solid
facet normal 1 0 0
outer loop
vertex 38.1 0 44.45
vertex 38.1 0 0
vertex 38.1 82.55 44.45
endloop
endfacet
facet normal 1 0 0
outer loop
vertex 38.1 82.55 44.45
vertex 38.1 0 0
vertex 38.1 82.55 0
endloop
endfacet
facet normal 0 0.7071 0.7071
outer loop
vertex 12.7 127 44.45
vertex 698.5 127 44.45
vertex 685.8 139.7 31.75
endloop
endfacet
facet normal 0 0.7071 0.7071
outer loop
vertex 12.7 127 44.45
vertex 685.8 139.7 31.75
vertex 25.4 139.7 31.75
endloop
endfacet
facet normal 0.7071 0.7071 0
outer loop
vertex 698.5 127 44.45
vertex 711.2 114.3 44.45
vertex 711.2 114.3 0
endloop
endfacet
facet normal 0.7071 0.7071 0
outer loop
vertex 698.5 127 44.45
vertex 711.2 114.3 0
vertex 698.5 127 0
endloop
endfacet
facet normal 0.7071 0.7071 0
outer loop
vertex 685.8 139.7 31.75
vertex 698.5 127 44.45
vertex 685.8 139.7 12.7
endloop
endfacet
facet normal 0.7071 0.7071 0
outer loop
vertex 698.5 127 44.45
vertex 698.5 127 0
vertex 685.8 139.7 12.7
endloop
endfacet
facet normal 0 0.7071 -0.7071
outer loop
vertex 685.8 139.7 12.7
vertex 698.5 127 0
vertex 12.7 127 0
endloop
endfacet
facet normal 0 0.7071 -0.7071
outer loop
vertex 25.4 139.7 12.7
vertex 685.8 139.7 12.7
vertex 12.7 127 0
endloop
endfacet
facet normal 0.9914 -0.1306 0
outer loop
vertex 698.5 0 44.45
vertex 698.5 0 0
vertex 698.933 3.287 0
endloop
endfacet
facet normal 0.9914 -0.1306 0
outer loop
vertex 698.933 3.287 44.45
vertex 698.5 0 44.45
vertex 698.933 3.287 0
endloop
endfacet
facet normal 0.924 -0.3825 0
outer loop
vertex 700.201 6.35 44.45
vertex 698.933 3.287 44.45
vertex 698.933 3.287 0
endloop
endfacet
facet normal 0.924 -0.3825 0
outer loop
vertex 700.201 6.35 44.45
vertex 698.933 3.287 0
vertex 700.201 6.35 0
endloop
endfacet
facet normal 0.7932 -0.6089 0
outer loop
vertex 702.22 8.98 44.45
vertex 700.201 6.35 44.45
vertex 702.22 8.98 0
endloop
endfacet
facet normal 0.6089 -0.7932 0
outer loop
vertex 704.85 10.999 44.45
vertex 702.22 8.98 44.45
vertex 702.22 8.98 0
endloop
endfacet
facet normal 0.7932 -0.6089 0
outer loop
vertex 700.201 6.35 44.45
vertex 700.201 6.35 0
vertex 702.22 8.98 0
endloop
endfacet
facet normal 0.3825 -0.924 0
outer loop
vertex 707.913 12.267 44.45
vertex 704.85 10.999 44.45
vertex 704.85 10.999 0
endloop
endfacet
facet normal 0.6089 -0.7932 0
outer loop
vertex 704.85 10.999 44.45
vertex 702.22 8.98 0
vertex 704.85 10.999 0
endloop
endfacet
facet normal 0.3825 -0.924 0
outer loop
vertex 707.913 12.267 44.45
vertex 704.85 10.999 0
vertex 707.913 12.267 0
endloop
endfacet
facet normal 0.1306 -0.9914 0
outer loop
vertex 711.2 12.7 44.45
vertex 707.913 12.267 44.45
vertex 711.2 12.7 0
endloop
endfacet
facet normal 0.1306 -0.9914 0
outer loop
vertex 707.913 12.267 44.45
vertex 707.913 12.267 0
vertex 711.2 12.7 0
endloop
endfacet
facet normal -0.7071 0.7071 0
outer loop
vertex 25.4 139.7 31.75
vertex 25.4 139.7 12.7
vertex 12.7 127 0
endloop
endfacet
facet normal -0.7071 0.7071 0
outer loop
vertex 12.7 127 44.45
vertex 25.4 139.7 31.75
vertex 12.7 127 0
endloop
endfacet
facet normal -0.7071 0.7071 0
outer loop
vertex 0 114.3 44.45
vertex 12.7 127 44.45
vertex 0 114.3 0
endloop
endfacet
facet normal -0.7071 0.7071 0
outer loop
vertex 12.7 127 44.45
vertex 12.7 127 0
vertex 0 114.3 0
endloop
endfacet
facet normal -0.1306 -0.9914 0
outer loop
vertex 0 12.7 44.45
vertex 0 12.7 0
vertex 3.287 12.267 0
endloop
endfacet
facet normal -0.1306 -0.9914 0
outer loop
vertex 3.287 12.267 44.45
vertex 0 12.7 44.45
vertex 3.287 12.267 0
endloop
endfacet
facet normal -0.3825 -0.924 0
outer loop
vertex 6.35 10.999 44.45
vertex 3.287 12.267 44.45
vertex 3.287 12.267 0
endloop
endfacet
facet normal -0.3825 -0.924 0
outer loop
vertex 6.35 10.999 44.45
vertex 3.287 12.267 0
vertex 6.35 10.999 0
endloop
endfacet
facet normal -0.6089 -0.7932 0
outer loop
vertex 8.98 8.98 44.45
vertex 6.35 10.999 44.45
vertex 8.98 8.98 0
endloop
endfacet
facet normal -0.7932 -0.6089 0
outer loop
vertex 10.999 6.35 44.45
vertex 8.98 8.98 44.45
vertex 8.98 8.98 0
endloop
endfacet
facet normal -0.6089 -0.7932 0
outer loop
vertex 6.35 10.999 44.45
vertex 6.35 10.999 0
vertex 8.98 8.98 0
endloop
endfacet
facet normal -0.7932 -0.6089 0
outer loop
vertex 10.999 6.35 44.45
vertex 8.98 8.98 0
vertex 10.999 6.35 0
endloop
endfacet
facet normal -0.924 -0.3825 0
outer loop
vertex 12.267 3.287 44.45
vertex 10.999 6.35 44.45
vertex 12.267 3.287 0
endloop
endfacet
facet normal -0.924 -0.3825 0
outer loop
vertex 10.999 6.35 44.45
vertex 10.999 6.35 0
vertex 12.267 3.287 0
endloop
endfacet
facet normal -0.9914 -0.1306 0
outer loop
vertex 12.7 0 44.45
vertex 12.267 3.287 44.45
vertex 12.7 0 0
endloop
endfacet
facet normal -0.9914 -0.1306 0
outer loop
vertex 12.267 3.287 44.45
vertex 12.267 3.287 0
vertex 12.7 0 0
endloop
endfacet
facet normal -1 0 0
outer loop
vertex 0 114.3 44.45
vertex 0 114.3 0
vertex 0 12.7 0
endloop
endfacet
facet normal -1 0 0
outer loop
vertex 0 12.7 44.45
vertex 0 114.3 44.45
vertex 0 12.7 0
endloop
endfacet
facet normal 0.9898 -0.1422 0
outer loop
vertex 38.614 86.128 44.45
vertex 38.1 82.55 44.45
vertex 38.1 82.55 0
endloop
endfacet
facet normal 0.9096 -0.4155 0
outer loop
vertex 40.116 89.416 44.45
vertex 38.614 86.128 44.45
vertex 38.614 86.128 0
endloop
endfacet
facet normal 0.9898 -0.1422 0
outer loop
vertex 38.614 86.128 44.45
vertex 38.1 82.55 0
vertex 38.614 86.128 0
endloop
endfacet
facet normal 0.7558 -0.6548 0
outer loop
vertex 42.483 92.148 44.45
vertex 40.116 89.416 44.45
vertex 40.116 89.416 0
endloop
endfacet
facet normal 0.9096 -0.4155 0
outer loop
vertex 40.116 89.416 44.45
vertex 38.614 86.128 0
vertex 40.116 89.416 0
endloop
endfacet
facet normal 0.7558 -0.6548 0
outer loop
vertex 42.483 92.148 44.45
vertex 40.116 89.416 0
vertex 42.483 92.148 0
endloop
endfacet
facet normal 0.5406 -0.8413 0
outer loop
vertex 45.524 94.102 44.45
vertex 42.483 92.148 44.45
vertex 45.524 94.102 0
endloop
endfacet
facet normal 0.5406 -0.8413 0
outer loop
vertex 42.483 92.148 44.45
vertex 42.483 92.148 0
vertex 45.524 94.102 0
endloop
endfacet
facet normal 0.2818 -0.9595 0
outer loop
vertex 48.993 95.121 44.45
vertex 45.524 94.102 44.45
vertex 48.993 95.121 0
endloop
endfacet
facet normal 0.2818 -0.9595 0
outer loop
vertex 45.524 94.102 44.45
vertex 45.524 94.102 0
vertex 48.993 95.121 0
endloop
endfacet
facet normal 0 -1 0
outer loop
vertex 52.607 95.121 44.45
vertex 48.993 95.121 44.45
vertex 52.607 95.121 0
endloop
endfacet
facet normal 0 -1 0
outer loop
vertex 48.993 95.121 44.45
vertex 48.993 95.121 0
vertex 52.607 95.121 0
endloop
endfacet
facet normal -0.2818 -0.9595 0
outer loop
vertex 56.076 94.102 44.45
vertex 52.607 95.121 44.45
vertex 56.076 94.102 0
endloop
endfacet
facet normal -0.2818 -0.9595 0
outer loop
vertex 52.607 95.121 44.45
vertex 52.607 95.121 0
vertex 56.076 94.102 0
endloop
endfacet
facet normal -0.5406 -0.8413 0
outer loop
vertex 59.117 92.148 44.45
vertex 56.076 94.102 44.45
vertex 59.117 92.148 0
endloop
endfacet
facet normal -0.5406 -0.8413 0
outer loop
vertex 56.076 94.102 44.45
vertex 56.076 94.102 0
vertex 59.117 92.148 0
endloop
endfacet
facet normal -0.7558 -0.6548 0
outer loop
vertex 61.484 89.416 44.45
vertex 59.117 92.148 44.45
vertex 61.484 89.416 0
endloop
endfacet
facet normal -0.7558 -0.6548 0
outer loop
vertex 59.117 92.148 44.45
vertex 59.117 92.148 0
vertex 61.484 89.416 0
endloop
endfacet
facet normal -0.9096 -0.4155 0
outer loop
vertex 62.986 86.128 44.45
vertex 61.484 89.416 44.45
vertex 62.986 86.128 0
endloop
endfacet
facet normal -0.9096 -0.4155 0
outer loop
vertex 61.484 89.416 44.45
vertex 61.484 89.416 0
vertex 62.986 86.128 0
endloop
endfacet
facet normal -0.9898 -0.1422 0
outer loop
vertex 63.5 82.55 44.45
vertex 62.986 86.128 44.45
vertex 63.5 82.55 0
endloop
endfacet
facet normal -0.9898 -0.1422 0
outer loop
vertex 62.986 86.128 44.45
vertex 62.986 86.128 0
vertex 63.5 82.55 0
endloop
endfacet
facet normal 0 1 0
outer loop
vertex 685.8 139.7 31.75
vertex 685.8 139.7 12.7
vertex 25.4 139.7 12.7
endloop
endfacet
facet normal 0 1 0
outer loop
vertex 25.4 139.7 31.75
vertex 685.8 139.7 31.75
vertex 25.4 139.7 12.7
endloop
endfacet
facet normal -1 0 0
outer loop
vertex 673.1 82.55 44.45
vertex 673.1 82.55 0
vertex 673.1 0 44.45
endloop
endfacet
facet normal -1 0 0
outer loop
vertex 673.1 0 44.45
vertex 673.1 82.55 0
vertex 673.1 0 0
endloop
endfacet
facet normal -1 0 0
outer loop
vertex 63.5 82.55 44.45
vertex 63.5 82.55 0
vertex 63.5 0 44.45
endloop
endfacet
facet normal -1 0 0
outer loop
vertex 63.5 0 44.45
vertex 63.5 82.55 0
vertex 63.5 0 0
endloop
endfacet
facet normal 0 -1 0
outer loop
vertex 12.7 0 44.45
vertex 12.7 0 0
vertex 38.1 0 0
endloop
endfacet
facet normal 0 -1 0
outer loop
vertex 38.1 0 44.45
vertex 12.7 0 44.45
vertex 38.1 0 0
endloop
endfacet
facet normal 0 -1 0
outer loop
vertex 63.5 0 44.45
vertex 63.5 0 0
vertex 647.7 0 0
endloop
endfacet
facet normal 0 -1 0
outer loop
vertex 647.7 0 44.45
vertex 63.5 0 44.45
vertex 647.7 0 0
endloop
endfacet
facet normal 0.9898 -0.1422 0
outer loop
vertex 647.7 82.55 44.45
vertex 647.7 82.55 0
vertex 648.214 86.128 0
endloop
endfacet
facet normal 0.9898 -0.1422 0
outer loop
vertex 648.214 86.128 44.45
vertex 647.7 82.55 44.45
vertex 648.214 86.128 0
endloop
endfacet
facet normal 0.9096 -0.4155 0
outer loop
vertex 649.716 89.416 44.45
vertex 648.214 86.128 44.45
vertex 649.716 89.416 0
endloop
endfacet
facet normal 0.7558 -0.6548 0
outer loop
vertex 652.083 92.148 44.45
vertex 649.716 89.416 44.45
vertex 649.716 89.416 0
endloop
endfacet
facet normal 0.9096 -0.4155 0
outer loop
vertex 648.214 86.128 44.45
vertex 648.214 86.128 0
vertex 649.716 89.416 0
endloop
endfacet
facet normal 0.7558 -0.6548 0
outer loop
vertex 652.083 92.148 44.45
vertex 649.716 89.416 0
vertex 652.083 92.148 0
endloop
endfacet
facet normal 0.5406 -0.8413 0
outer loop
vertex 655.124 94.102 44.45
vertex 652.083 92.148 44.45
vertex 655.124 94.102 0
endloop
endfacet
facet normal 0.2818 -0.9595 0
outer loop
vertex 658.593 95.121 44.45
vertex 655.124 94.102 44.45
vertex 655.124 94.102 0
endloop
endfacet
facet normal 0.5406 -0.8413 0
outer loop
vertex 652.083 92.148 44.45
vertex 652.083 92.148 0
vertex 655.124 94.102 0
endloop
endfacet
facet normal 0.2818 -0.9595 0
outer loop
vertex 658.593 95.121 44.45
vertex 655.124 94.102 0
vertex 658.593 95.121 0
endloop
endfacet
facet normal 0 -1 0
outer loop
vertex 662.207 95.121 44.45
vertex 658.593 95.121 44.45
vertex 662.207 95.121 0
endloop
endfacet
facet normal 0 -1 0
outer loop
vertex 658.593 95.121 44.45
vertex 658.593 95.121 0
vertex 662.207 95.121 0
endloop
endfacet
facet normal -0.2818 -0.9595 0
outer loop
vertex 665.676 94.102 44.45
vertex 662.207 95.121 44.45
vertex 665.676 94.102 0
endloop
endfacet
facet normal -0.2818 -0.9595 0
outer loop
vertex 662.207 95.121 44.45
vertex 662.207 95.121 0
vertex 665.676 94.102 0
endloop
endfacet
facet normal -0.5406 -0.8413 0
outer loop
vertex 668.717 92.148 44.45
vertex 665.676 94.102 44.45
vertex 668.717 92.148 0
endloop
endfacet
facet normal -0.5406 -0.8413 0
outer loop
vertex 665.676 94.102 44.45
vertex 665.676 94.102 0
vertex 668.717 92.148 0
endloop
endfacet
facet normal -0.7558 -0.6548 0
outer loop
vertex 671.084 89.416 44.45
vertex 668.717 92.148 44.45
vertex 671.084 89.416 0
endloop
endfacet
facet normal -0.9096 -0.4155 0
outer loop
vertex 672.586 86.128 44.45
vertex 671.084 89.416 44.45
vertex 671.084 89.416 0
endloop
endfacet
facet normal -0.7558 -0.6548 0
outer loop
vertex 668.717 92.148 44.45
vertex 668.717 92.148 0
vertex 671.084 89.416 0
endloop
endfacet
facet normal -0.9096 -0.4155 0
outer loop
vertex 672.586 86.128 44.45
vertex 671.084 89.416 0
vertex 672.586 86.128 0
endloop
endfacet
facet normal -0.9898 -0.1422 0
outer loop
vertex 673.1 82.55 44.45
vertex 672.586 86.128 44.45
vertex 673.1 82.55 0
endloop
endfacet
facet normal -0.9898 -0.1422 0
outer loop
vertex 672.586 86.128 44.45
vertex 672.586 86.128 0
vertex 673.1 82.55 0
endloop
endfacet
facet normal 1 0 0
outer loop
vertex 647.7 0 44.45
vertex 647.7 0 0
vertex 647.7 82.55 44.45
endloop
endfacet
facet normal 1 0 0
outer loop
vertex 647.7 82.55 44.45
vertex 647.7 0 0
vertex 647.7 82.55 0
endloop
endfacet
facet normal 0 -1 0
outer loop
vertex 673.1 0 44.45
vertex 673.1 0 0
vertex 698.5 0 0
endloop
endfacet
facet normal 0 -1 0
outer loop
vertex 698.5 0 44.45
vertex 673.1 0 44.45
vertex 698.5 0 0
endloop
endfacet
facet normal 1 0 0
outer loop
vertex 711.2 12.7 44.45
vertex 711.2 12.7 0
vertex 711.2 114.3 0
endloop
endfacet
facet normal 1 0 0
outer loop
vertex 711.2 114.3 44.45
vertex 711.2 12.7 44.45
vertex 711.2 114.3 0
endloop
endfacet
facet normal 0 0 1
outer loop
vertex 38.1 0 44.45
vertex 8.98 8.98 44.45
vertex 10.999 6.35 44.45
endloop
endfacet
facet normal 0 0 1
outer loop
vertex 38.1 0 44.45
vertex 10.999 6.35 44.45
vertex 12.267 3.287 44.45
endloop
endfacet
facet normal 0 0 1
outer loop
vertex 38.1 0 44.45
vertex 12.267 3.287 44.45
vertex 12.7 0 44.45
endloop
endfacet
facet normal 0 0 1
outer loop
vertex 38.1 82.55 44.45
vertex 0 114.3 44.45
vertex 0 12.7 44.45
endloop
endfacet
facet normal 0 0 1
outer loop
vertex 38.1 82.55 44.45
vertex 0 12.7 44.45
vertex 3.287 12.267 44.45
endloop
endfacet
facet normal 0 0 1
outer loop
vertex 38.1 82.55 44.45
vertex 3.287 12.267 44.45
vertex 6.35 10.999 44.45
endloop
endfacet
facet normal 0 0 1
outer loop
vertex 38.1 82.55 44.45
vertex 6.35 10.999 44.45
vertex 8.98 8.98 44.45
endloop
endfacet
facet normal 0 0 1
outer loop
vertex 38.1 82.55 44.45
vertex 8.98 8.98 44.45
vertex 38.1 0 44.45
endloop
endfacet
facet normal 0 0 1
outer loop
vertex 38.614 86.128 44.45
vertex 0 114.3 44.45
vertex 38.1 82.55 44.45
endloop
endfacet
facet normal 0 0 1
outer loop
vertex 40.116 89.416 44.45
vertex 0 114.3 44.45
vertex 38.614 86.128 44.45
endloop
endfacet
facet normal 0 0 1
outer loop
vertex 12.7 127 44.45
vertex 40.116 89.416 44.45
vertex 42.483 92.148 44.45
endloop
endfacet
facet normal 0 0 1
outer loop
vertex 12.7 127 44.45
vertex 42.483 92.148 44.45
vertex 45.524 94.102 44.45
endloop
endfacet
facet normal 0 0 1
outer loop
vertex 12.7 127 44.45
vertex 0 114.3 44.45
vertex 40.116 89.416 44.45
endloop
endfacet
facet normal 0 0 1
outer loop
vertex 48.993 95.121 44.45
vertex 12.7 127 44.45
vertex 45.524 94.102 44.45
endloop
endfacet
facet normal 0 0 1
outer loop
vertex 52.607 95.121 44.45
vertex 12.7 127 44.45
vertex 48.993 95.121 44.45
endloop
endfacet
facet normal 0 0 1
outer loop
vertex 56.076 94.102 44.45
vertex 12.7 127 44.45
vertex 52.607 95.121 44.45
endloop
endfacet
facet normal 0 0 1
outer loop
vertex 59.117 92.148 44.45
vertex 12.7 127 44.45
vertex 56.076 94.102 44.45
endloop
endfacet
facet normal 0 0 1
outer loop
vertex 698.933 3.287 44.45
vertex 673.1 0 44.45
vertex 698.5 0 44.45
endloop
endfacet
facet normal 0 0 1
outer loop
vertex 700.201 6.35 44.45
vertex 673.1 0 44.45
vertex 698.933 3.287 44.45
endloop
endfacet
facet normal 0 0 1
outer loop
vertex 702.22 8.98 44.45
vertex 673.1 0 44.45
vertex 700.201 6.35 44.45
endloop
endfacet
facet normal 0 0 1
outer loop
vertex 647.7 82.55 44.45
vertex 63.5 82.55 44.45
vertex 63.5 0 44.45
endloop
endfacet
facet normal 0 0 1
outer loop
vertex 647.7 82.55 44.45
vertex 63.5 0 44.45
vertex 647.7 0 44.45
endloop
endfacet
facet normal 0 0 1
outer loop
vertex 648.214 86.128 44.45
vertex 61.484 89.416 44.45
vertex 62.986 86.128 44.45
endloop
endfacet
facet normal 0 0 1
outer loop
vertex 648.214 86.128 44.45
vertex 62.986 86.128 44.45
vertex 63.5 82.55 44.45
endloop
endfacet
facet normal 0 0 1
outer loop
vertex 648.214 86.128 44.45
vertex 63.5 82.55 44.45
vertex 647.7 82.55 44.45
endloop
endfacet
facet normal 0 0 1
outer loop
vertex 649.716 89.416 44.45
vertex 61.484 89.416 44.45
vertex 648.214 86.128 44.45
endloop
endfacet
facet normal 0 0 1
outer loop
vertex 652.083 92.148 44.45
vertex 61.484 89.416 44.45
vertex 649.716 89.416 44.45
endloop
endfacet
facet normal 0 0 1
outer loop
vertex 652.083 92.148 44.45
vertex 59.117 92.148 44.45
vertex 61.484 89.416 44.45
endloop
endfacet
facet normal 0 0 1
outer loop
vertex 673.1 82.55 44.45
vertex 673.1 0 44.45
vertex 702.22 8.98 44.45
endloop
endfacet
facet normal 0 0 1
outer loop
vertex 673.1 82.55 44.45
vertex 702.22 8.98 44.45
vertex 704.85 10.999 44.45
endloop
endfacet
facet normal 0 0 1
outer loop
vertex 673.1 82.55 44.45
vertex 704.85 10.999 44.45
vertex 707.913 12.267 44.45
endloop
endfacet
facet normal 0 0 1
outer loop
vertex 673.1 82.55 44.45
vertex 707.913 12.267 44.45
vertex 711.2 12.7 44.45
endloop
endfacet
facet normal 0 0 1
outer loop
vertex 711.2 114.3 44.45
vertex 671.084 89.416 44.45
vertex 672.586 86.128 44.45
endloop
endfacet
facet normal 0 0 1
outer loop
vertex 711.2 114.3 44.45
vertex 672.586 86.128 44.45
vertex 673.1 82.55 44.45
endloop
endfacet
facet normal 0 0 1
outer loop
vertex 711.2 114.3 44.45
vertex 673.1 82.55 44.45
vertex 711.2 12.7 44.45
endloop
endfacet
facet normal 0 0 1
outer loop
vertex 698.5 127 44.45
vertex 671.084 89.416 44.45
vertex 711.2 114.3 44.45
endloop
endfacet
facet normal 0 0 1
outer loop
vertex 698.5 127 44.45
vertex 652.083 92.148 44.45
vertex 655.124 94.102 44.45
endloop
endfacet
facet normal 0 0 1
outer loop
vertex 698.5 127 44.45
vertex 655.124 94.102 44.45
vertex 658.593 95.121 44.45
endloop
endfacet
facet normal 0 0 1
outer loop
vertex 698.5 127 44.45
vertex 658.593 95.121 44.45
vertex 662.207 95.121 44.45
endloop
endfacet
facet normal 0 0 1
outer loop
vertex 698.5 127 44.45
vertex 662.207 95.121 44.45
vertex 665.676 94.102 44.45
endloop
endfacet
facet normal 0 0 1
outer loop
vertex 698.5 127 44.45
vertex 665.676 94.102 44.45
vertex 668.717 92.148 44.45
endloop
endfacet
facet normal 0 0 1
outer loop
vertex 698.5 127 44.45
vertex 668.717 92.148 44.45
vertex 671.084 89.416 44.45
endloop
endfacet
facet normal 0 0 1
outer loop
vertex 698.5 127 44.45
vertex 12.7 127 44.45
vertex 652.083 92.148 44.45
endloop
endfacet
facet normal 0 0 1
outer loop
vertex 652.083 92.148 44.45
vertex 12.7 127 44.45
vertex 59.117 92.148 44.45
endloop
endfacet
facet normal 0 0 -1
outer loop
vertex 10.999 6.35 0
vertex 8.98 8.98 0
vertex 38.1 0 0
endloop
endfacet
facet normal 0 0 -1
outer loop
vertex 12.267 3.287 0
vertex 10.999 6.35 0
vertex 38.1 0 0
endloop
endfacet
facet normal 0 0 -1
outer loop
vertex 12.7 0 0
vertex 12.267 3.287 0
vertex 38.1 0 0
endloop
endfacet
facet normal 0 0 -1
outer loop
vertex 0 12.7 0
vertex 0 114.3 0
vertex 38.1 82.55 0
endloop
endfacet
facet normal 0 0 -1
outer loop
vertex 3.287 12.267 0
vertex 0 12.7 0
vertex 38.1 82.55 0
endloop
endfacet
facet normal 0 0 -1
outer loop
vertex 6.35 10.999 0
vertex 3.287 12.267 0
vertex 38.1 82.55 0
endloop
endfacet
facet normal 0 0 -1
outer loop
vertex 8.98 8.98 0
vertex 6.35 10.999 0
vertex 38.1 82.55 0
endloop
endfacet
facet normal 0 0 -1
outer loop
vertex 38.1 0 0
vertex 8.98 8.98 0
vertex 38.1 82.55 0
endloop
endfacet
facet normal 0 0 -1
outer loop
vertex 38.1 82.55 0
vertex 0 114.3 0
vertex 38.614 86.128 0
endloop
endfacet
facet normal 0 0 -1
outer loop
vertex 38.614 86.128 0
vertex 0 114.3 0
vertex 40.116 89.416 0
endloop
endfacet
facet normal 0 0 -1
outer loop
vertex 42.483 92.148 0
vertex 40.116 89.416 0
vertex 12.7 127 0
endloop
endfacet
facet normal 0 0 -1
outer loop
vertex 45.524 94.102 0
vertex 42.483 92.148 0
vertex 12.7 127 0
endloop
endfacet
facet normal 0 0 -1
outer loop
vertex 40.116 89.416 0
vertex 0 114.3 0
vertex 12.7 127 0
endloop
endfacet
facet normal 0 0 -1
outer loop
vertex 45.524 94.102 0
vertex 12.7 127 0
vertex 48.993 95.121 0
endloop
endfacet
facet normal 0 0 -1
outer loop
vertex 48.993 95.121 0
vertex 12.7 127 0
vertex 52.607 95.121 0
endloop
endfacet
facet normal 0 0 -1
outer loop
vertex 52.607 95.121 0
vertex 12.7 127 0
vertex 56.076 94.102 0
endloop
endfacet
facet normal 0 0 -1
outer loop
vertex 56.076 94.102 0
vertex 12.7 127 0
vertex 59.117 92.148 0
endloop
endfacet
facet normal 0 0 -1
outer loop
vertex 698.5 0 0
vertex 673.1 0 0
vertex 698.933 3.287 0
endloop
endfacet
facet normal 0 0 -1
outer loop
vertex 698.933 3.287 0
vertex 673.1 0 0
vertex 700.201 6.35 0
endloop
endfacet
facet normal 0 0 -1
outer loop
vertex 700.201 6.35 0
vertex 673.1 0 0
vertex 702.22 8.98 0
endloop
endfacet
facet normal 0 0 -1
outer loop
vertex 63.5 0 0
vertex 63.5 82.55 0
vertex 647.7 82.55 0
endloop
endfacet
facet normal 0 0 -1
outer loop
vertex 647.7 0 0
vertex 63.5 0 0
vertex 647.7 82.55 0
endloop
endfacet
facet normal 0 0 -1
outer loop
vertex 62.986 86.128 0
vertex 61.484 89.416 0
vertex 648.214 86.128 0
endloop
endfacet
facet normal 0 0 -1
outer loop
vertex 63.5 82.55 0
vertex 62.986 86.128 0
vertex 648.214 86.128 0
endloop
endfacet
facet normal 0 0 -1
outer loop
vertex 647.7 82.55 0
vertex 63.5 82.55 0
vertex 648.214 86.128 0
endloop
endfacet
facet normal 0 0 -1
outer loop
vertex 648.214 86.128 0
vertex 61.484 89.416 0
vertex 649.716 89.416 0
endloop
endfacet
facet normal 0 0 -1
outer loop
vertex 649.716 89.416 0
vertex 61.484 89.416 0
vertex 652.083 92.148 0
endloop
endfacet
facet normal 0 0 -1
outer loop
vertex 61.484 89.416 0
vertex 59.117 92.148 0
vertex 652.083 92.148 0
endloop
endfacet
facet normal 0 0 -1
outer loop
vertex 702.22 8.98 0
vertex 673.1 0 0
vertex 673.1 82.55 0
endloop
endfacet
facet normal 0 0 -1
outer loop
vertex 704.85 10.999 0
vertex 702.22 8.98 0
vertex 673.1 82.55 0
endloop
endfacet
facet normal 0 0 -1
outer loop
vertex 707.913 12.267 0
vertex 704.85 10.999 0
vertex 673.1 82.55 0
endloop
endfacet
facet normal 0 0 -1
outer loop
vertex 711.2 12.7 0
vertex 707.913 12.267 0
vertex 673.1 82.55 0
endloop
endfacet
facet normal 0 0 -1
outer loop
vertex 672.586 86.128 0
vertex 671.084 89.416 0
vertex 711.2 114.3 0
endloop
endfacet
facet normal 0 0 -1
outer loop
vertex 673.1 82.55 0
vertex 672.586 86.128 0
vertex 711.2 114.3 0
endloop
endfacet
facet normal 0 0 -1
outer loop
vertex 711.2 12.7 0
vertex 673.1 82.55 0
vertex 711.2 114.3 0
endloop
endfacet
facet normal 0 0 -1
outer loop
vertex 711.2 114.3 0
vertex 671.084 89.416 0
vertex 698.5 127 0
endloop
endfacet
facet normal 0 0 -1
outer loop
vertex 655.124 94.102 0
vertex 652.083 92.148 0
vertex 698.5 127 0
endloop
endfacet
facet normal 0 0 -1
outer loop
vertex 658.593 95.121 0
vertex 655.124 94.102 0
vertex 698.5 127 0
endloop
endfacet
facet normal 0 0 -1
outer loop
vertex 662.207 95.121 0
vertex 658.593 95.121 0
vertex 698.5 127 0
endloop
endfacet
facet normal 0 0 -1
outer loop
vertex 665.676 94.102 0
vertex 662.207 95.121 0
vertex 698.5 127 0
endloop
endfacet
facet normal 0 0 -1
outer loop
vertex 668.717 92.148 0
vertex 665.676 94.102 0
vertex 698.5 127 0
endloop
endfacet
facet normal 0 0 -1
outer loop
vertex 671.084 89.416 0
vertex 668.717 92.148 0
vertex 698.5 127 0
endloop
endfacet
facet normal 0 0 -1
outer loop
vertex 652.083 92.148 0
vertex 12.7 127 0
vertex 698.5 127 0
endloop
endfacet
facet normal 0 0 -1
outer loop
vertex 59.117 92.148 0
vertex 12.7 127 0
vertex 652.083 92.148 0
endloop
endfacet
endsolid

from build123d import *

# Parameters (mm, degrees)
F1_DEPTH = 44.45
F2_SIZE  = 12.7


with BuildPart() as f1:
    # F0 (on Top) → F1 (new body)
    with BuildSketch(Plane.XY):
        with BuildLine():
            ThreePointArc((38.1, 82.55), (50.8, 95.25), (63.5, 82.55))
            Line((63.5, 82.55), (63.5, 0))
            Line((63.5, 0), (105.023582, 0))
            Line((105.023582, 0), (355.6, 0))
            Line((355.6, 0), (606.176418, 0))
            Line((606.176418, 0), (647.7, 0))
            Line((647.7, 0), (647.7, 82.55))
            ThreePointArc((647.7, 82.55), (660.4, 95.25), (673.1, 82.55))
            Line((673.1, 82.55), (673.1, 0))
            Line((673.1, 0), (698.5, 0))
            ThreePointArc((698.5, 0), (702.219744, 8.980256), (711.2, 12.7))
            Line((711.2, 12.7), (711.2, 114.3))
            Line((711.2, 114.3), (685.8, 139.7))
            Line((685.8, 139.7), (355.6, 139.7))
            Line((355.6, 139.7), (25.4, 139.7))
            Line((25.4, 139.7), (0, 114.3))
            Line((0, 114.3), (0, 12.7))
            ThreePointArc((0, 12.7), (8.980256, 8.980256), (12.7, 0))
            Line((12.7, 0), (38.1, 0))
            Line((38.1, 0), (38.1, 82.55))
        make_face()
    extrude(amount=F1_DEPTH)

    # F2
    f2_edges = [f1.edges().sort_by_distance(p)[0] for p in [
        (355.6, 139.7, 44.45),
        (355.6, 139.7, 0),
    ]]
    chamfer(f2_edges, length=F2_SIZE)


solid = f1.part
